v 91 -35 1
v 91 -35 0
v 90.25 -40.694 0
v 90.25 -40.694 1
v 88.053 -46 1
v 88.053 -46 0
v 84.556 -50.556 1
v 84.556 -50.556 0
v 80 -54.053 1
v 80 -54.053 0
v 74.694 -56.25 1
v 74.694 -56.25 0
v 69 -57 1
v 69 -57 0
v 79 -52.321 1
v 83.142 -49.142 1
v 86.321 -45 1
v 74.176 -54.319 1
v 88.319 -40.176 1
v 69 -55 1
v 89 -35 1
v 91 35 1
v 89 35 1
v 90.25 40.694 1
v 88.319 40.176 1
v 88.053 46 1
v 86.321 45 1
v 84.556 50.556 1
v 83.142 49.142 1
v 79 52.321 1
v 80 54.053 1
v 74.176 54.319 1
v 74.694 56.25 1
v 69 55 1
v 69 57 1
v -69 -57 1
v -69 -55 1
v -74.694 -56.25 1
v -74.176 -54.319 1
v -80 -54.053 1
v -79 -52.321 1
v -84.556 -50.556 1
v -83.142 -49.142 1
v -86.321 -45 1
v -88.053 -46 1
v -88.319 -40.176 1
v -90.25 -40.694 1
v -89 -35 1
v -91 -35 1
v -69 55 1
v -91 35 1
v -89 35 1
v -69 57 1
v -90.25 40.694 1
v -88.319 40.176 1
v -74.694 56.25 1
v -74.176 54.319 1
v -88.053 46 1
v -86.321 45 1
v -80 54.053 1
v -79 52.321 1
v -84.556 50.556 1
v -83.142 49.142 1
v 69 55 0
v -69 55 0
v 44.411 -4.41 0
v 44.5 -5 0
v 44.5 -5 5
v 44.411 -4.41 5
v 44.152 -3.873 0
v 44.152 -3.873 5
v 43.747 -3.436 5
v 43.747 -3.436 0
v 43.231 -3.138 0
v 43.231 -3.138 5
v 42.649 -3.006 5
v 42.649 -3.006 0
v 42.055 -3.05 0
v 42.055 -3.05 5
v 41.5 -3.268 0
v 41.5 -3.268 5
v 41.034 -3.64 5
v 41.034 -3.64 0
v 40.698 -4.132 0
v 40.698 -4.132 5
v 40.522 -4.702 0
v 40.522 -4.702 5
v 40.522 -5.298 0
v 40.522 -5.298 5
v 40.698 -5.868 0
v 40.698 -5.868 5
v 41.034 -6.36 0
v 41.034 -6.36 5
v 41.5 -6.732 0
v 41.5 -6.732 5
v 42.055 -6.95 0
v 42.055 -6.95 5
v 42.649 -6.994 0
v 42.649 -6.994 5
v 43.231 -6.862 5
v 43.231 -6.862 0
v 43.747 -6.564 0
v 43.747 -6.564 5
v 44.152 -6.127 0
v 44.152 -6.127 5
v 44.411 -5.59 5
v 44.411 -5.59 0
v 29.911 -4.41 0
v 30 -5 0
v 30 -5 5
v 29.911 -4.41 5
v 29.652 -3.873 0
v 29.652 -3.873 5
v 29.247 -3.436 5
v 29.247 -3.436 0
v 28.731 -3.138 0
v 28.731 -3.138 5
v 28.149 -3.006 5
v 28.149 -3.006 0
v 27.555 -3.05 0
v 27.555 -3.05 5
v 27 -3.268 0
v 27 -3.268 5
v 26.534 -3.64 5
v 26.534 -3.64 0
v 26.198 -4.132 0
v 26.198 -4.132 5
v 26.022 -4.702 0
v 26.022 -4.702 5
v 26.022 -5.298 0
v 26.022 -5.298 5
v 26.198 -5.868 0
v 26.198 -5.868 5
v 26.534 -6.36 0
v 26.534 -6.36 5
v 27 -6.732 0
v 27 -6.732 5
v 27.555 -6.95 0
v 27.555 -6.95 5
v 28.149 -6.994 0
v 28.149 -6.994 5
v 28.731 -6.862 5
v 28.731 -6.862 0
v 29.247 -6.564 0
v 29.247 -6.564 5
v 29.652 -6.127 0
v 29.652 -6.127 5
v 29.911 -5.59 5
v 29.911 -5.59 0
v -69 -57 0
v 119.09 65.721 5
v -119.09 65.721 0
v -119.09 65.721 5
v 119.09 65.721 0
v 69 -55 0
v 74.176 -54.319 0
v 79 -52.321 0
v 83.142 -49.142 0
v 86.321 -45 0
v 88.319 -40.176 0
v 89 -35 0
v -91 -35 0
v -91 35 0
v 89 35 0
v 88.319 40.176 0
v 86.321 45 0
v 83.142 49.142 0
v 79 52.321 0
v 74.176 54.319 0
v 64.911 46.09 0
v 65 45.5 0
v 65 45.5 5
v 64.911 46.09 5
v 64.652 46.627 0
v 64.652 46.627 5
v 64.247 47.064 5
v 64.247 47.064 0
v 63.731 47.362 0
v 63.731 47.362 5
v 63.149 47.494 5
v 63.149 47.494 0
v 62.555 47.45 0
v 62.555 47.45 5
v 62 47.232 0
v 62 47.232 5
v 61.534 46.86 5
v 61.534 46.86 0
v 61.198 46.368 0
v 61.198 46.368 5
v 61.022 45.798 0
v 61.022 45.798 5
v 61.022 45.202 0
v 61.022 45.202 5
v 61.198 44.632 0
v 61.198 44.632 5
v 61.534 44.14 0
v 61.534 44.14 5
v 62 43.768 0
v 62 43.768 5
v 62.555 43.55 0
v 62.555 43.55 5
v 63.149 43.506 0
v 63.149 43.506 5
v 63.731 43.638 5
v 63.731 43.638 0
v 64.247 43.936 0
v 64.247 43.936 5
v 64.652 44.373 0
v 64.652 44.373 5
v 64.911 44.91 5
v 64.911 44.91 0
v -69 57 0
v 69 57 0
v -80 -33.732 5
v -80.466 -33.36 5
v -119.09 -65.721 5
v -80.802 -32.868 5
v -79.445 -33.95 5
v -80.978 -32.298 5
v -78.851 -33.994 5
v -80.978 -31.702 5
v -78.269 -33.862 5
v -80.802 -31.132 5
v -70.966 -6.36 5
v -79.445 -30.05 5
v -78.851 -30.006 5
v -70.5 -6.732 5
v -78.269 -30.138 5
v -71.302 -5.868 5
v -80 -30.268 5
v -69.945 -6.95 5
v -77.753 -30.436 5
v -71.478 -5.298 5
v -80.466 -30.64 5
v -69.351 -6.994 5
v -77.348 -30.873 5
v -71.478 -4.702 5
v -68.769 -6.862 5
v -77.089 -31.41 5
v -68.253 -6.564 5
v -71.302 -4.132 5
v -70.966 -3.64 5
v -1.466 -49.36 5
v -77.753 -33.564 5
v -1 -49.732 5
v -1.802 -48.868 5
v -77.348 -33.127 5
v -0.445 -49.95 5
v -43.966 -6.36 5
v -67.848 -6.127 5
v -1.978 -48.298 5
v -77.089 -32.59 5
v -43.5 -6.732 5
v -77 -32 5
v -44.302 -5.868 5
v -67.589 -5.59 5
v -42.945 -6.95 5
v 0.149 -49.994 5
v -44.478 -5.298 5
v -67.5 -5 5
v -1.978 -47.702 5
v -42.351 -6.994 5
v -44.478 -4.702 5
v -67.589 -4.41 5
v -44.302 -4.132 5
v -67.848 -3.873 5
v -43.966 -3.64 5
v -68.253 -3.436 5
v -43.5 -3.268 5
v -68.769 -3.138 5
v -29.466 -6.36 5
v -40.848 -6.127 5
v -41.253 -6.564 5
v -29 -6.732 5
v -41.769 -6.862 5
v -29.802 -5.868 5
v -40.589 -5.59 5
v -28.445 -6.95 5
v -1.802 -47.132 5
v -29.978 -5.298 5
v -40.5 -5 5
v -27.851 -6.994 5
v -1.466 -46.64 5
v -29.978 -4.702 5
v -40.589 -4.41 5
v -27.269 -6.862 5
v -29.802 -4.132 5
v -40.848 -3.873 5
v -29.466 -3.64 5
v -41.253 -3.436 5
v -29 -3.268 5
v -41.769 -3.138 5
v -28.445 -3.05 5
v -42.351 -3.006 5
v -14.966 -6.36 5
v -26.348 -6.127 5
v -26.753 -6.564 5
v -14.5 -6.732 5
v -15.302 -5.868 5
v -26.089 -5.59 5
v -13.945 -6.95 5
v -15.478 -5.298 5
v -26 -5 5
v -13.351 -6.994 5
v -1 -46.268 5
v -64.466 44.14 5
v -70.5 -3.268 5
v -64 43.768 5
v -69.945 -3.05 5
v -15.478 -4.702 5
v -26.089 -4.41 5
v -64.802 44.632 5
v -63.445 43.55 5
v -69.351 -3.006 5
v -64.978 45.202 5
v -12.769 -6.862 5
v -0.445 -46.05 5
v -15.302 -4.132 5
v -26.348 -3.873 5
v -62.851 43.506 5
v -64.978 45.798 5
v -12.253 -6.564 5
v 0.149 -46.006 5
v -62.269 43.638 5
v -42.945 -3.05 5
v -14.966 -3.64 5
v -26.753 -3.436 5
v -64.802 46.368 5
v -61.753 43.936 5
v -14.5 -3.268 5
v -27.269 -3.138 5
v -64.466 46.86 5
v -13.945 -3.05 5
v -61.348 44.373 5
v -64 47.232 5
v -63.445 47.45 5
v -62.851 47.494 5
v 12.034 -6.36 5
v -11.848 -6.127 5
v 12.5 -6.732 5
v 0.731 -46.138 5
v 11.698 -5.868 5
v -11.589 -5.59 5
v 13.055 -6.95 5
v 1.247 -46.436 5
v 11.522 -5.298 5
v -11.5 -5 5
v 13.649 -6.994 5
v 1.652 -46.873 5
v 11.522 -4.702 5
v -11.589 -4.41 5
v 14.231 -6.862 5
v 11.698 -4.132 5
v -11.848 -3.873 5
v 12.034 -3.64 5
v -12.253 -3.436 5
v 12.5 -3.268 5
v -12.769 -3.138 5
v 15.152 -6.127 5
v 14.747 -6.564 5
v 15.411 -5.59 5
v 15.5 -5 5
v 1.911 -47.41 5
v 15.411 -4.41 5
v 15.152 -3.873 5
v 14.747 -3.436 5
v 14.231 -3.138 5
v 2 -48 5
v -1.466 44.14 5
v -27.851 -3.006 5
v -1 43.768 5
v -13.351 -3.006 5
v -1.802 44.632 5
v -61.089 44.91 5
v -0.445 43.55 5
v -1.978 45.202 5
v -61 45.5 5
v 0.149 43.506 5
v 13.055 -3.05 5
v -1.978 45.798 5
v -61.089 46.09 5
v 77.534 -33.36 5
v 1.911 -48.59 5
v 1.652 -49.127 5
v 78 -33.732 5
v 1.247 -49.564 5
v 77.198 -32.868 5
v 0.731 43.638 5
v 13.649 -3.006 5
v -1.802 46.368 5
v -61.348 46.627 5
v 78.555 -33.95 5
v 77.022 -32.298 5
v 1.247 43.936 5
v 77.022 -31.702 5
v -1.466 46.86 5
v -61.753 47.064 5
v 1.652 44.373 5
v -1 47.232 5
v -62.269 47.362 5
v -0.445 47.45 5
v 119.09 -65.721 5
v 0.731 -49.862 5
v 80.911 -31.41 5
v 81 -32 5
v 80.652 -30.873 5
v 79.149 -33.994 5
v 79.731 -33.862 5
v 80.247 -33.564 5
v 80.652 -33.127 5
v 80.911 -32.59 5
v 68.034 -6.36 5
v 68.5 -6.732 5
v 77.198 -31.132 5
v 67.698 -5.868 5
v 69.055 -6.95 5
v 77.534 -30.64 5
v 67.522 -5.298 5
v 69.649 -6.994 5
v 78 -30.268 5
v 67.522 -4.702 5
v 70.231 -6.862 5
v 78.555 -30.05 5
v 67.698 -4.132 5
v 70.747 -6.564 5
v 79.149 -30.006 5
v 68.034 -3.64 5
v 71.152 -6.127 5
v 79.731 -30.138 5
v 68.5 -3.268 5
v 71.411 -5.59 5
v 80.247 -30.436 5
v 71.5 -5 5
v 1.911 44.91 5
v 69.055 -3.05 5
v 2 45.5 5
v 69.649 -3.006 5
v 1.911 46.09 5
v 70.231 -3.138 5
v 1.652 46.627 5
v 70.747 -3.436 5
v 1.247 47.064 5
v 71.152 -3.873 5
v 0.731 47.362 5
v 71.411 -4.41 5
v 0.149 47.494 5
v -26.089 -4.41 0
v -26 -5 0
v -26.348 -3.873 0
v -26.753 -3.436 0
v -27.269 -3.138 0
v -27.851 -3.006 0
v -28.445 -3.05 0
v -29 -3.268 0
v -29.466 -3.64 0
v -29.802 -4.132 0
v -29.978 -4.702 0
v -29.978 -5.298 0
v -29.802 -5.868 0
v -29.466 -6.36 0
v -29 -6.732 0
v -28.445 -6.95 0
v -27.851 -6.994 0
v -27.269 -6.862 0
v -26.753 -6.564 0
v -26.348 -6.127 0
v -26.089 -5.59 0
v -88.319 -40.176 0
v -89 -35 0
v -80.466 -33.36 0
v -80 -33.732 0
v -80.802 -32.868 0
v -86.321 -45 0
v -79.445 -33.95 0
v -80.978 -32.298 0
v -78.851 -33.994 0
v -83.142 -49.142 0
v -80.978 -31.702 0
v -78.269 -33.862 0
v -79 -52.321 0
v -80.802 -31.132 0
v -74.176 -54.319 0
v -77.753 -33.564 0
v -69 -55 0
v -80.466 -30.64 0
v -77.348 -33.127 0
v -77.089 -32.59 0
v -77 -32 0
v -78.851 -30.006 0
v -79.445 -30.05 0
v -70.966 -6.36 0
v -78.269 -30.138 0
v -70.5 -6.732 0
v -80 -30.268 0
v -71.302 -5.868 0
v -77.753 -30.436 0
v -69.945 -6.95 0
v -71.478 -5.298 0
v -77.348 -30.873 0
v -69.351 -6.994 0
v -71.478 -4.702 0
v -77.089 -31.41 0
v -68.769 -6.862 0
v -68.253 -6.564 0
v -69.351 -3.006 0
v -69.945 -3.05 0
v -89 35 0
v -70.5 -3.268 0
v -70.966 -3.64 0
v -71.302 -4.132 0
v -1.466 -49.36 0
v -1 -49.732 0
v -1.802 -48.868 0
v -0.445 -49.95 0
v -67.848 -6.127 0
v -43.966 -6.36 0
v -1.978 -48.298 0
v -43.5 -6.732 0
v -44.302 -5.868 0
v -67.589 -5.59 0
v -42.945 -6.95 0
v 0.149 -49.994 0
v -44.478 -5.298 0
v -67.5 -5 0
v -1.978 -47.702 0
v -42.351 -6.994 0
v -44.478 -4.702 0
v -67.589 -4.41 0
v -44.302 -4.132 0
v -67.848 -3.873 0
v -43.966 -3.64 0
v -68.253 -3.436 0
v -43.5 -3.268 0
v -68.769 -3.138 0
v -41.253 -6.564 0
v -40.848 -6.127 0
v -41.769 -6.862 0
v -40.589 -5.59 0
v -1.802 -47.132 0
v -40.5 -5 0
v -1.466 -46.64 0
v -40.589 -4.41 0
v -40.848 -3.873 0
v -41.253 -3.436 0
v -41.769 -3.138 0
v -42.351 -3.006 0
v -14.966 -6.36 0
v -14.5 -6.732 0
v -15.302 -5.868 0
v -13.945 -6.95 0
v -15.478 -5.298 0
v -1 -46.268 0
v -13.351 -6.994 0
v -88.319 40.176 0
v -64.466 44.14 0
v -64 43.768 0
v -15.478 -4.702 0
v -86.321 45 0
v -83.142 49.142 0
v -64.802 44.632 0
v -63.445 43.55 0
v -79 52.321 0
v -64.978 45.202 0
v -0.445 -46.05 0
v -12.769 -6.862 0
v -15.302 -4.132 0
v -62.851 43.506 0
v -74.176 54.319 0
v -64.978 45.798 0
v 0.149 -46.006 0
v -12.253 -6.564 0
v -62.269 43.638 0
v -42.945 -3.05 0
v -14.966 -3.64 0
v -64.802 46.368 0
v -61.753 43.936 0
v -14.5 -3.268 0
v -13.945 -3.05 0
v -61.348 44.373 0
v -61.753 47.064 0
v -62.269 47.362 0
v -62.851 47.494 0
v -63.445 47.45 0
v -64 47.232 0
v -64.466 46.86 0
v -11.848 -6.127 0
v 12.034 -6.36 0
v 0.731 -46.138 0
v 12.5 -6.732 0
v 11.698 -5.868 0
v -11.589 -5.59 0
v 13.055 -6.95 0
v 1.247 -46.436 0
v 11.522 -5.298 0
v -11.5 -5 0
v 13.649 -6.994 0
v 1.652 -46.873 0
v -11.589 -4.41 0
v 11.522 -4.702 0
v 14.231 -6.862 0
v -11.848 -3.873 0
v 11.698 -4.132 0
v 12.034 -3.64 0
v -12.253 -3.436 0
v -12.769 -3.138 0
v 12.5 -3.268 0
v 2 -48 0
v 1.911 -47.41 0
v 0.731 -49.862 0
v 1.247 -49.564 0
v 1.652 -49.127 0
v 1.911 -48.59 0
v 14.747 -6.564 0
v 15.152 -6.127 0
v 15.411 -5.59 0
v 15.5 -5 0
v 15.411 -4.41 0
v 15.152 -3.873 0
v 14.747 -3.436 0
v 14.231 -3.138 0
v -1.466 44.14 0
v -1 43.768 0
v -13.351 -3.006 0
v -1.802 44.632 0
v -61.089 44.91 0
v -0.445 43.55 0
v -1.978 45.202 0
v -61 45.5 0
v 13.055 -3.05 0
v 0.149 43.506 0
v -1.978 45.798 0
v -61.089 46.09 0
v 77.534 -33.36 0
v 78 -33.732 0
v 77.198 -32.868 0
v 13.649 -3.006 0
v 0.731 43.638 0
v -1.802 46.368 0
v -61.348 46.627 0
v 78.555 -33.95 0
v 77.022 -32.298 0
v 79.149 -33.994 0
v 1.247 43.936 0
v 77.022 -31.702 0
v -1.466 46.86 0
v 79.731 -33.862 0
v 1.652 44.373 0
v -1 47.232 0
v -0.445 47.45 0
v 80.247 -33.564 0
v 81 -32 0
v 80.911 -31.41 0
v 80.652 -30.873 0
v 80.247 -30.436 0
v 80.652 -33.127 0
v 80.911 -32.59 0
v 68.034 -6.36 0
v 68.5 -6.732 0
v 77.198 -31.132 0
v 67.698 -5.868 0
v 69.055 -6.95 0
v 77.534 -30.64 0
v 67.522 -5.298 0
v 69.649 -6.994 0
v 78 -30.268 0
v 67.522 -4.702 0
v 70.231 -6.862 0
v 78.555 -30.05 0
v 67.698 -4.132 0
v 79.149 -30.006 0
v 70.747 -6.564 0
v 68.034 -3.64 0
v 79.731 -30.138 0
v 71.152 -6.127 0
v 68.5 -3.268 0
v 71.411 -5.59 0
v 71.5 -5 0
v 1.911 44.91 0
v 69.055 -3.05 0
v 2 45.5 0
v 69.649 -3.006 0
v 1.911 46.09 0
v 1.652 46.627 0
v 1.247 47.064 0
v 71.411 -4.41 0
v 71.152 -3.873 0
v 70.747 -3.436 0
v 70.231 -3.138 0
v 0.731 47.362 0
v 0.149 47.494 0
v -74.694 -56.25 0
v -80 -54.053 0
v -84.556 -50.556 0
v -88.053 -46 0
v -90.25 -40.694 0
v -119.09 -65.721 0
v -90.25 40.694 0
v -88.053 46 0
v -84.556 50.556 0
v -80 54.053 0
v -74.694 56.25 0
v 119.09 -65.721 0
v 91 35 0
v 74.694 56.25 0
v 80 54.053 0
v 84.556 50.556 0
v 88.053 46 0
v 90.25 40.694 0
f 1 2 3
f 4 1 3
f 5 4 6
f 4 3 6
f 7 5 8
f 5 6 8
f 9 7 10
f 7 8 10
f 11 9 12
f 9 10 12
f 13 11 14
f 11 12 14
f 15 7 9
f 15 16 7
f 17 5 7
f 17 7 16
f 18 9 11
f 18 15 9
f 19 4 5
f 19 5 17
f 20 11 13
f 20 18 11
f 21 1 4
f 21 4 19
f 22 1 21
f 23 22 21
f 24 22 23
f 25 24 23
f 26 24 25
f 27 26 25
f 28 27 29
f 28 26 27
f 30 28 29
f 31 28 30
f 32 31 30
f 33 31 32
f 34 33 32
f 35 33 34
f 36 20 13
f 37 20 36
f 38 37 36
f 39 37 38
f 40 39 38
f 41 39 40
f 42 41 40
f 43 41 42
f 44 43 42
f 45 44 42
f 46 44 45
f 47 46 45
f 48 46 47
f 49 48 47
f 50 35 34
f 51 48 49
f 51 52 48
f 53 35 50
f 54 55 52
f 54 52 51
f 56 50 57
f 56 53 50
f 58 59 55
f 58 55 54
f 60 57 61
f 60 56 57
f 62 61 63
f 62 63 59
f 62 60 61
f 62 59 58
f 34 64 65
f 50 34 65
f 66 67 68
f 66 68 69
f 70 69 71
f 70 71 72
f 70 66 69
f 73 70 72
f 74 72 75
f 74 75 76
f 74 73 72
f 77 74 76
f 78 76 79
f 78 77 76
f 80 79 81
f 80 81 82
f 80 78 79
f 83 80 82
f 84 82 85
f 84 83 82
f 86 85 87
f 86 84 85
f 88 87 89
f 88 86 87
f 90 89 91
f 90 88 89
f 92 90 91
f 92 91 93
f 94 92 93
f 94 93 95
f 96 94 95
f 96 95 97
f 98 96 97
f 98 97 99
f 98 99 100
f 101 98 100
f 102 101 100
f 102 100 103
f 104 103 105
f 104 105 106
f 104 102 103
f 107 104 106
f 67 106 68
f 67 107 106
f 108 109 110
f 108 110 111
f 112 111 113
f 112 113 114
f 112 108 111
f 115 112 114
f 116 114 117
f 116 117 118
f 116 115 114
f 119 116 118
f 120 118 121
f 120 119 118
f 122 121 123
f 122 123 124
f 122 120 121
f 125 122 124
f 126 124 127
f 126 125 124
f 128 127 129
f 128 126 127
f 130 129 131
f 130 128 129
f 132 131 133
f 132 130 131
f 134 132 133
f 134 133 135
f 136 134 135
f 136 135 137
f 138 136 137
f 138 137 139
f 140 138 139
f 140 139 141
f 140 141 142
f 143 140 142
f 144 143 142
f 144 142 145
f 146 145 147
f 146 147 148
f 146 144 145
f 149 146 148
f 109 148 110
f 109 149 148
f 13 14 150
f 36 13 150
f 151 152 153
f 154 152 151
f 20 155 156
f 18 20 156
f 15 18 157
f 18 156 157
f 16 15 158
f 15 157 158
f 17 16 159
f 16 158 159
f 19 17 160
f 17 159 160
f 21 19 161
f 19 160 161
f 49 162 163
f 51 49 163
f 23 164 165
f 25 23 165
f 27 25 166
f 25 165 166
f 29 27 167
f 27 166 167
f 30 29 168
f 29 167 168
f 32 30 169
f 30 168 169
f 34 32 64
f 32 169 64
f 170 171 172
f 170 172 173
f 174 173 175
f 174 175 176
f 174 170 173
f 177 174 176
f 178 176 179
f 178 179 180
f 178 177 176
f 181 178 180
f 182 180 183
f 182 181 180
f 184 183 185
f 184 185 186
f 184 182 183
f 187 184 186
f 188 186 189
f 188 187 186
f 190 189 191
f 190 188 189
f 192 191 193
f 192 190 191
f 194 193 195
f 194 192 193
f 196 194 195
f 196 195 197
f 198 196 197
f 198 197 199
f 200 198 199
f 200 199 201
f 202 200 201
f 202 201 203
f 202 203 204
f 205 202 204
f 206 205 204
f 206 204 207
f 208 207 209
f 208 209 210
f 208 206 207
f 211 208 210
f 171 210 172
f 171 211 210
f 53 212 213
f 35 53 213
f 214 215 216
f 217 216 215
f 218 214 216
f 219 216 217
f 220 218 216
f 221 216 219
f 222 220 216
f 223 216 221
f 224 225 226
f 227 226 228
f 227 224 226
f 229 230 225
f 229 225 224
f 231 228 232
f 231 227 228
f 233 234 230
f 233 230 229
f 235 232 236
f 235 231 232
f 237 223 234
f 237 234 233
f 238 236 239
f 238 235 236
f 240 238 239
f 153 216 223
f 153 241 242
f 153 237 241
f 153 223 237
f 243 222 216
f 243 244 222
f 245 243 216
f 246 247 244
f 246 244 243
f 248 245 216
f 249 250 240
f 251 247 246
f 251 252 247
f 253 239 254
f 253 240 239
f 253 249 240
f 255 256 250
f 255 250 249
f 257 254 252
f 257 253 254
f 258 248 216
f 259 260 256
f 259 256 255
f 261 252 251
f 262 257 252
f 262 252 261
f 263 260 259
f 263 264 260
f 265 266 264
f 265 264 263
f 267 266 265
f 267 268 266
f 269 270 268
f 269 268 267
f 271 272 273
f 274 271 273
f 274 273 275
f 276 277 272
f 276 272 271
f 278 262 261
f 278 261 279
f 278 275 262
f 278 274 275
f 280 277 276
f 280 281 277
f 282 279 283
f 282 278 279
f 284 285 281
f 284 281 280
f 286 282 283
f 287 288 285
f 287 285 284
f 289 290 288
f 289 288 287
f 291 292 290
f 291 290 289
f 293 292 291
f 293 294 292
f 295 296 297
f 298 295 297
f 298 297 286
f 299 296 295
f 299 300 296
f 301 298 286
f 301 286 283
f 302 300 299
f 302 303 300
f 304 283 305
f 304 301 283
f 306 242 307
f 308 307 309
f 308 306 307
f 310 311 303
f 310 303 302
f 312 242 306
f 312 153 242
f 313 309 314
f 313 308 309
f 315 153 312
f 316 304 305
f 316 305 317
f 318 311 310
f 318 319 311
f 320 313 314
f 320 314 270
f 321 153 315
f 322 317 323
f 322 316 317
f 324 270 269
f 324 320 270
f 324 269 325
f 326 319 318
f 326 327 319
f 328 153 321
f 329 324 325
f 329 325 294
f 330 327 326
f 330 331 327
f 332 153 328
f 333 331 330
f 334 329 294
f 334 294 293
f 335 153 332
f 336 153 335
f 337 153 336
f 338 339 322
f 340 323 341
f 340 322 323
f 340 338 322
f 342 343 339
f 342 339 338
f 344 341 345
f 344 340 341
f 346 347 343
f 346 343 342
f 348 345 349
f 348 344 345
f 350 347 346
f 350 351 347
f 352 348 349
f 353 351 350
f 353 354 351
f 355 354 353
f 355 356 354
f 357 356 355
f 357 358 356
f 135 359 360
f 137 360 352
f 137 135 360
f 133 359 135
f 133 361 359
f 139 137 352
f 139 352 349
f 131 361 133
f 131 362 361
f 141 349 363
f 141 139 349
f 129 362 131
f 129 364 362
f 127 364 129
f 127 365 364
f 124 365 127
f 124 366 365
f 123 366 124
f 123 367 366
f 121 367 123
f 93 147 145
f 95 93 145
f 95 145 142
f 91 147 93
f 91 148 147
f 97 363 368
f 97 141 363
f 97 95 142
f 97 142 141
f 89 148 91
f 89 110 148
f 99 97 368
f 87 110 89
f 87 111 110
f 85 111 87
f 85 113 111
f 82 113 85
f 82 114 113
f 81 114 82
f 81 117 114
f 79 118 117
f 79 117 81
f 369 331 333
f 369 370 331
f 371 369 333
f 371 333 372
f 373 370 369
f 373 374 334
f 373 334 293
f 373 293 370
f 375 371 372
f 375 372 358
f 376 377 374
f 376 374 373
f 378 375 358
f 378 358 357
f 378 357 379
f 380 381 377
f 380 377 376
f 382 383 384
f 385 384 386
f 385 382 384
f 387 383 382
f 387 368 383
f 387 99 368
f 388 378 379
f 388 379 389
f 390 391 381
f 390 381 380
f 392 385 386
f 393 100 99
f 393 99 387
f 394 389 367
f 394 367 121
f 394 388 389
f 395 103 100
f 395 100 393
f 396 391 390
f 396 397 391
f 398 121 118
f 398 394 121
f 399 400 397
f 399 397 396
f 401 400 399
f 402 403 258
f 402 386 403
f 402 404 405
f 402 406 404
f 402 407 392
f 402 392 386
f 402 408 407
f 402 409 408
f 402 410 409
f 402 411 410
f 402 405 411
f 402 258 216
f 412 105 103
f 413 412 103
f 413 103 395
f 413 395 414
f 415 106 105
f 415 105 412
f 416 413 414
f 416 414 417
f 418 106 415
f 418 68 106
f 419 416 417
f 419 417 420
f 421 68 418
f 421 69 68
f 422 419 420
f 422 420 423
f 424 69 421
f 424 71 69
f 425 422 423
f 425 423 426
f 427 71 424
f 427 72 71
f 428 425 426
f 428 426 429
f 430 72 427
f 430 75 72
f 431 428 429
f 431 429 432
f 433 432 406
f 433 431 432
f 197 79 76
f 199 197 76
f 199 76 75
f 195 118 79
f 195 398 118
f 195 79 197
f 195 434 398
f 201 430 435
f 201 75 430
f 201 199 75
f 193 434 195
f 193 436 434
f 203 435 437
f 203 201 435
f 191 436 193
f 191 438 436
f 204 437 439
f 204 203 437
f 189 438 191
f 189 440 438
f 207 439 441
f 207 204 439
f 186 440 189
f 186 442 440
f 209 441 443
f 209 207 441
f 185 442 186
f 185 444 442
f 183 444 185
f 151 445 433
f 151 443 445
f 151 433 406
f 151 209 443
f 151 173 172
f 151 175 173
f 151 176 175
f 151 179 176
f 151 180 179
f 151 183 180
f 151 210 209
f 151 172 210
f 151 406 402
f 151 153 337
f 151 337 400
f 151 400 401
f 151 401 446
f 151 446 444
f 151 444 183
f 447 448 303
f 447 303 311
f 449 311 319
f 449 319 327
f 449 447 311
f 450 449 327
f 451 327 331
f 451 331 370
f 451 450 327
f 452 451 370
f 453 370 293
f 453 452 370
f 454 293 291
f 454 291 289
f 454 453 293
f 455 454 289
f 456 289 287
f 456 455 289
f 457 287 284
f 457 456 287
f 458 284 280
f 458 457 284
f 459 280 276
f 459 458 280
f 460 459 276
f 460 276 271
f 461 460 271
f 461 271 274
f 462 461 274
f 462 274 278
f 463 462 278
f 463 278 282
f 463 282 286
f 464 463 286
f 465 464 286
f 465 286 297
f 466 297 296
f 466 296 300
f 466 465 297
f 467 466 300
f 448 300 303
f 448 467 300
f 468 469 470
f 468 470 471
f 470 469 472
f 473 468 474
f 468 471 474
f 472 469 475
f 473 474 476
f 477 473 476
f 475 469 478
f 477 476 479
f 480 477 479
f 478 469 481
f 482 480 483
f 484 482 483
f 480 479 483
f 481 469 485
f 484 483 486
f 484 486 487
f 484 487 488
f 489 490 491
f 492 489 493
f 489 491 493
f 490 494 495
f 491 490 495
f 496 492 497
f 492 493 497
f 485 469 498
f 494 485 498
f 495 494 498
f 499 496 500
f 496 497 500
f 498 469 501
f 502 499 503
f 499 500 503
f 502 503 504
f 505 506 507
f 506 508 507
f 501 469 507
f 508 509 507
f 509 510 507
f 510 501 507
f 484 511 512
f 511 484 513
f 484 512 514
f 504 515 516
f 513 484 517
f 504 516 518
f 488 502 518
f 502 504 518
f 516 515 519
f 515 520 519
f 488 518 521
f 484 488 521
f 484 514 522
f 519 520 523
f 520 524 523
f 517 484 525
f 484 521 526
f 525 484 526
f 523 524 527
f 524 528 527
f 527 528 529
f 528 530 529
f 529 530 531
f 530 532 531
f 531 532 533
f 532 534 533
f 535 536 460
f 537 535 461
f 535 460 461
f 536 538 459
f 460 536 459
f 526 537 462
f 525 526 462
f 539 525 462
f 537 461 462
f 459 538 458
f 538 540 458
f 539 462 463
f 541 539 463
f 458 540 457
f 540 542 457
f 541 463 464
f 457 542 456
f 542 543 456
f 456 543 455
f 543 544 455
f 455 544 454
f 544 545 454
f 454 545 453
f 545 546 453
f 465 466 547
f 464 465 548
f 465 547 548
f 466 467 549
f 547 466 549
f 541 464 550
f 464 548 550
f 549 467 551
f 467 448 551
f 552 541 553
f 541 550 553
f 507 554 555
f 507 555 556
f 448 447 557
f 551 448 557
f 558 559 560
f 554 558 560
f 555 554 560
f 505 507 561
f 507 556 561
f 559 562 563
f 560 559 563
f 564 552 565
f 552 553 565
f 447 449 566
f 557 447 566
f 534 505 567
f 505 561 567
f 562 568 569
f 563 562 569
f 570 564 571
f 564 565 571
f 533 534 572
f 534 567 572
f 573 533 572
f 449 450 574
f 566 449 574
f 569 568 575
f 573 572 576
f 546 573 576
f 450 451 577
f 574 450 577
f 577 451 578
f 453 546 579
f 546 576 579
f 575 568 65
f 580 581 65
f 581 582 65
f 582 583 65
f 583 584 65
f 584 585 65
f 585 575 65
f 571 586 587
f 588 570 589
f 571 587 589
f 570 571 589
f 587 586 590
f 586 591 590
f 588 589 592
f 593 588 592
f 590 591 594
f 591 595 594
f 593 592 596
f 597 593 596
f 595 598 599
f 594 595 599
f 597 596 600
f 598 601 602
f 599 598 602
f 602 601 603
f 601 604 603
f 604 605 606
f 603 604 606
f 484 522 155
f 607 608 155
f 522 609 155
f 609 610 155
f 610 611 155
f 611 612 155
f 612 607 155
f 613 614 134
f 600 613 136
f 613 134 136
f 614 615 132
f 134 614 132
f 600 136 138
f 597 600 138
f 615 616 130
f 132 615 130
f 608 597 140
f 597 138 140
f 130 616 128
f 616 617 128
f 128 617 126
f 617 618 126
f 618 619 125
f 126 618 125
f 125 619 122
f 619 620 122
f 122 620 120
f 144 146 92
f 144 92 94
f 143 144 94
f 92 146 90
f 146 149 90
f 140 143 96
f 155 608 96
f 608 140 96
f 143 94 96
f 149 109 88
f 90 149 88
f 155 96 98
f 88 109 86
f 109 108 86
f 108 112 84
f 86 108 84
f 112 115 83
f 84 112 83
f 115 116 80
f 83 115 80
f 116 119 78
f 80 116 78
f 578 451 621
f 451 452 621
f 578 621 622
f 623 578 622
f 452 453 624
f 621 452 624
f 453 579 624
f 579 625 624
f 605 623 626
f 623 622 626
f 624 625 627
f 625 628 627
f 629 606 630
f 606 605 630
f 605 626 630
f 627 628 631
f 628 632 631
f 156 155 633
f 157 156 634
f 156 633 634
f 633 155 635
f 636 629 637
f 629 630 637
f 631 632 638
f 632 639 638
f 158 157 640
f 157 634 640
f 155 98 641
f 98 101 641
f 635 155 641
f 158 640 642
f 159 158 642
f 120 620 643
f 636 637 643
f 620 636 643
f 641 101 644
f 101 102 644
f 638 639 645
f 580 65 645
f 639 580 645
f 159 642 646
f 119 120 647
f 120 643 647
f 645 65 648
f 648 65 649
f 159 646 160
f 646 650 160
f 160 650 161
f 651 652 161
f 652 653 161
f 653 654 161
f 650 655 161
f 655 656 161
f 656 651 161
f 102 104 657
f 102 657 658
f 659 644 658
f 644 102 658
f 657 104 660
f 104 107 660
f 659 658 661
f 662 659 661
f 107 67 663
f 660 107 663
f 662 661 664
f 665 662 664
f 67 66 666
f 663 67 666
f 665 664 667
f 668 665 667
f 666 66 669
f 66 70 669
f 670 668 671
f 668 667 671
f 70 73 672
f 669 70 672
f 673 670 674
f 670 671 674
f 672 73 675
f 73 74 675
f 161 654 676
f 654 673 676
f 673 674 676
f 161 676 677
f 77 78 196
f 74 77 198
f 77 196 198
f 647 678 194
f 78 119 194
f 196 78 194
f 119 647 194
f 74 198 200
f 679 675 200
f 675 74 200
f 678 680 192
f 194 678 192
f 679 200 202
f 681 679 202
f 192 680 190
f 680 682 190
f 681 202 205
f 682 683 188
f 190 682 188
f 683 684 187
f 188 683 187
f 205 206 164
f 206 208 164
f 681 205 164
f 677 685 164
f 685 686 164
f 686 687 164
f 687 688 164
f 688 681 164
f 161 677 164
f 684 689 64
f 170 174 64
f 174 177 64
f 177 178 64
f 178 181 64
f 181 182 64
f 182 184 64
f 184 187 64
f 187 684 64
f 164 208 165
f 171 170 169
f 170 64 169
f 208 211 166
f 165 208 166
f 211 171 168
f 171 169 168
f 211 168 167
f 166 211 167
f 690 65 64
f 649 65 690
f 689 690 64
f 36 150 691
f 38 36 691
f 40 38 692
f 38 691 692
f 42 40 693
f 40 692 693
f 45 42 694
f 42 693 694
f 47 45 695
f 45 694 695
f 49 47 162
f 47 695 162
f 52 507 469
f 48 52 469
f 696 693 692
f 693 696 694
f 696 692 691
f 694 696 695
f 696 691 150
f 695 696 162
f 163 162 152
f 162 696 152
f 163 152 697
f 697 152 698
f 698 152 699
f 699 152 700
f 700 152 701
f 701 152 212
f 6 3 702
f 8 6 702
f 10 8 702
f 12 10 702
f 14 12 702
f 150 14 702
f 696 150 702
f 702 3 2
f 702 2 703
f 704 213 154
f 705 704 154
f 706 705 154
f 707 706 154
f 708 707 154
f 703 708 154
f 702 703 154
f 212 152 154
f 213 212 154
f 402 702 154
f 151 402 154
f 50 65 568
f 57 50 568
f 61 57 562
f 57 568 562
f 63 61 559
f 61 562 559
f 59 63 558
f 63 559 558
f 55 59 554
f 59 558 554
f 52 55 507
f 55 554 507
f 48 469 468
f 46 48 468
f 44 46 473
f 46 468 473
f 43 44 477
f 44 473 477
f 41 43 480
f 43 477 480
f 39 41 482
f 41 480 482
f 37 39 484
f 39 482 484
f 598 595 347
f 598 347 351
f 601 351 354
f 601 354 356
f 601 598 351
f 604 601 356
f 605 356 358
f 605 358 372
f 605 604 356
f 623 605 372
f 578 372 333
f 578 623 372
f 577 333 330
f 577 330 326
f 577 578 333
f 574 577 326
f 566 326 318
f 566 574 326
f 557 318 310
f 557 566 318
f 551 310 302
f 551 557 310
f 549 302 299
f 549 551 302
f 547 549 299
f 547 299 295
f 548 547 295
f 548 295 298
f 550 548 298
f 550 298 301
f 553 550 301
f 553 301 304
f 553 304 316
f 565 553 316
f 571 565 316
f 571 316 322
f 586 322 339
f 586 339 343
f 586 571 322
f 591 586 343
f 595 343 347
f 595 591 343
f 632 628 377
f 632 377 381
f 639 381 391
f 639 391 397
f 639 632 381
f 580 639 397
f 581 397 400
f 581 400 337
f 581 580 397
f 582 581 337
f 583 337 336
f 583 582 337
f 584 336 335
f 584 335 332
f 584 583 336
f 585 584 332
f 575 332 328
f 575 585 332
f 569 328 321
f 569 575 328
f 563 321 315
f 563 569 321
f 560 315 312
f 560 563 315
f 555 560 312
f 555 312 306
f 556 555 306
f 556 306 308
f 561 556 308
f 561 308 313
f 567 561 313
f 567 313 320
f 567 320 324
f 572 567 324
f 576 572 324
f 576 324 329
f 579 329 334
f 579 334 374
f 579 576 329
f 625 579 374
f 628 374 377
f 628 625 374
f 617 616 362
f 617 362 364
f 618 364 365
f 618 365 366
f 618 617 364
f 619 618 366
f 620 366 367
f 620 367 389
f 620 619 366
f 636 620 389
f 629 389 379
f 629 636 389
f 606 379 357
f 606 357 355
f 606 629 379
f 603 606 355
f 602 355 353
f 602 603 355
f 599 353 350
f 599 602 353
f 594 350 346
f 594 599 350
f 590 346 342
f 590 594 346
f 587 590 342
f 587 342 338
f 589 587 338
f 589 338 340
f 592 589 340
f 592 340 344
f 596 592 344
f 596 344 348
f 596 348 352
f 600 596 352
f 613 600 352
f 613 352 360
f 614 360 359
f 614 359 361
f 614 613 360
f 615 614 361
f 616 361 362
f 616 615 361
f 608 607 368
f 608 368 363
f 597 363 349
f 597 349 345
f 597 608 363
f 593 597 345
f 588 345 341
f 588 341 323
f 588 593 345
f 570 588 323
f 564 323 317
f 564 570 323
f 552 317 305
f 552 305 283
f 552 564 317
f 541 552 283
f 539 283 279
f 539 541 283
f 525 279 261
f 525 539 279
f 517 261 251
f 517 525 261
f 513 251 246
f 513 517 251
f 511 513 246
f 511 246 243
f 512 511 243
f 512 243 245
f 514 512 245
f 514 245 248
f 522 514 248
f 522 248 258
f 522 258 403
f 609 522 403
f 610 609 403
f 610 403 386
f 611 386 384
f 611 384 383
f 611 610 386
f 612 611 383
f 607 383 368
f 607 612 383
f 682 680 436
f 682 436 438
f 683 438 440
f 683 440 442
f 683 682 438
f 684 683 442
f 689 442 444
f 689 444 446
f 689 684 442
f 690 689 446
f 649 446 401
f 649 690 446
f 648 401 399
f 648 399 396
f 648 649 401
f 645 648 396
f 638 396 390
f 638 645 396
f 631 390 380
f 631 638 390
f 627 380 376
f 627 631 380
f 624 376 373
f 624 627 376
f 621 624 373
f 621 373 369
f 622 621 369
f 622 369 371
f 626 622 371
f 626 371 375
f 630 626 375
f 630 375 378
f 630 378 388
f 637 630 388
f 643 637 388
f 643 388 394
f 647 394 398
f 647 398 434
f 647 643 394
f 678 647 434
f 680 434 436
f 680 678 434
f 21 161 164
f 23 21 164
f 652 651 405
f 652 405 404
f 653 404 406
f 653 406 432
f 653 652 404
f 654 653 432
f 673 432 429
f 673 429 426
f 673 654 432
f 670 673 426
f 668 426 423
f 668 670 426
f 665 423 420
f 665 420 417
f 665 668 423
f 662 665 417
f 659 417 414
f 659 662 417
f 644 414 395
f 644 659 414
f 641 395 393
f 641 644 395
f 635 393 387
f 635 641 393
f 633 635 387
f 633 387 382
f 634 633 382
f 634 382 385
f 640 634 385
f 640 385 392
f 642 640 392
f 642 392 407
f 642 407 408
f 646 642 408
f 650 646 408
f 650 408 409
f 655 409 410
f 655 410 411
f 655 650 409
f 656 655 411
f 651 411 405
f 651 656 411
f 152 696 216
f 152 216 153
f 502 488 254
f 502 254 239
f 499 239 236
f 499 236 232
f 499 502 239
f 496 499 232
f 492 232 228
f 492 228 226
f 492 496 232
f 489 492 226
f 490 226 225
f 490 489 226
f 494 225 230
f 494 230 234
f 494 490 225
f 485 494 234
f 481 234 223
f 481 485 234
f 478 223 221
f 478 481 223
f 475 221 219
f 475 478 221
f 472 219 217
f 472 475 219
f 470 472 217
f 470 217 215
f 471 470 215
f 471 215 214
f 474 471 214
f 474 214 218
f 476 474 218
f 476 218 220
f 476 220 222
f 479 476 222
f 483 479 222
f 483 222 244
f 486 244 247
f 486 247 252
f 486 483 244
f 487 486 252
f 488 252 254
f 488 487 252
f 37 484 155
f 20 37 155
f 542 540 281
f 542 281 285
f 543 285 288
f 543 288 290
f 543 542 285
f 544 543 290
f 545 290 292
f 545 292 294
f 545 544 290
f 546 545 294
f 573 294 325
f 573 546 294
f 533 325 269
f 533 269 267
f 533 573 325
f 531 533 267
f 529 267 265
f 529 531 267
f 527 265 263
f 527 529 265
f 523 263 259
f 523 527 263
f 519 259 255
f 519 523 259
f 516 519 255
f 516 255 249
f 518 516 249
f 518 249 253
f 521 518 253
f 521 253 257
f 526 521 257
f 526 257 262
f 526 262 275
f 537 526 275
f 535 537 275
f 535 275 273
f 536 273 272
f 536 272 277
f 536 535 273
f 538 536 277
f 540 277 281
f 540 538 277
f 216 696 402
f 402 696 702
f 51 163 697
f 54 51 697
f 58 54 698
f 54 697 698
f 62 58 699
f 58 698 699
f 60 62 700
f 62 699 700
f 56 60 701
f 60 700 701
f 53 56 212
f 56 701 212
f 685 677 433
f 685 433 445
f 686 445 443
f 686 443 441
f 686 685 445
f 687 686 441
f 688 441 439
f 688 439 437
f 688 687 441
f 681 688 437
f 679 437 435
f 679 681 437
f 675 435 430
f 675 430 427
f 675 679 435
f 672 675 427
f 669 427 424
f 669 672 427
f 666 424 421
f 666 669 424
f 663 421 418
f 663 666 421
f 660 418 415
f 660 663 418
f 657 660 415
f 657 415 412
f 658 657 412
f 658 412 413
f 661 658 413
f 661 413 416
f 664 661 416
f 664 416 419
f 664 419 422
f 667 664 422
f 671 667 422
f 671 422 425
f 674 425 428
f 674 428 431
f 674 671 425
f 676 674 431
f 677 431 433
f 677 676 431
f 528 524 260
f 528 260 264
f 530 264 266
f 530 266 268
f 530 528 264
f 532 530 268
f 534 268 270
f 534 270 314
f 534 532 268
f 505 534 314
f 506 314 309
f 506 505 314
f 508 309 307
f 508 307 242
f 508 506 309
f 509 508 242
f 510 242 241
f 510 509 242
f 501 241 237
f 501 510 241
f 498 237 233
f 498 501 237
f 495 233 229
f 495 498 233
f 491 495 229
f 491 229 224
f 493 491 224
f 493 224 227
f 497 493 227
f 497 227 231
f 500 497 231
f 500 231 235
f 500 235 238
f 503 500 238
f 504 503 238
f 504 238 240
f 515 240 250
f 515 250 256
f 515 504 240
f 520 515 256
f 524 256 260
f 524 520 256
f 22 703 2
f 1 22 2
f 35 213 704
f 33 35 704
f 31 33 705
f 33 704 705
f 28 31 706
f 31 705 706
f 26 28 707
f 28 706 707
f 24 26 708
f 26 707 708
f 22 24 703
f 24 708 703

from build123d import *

# Parameters (mm, degrees)
SKETCH_2_W          = 238.179152398
SKETCH_2_H          = 131.442897672
SKETCH_2_R          = 2
EXTRUDE_1_DEPTH     = 5
CUT_EXTRUDE_1_DEPTH = 1


with BuildPart() as part:
    # 草图2 → 凸台-拉伸1 (new body)
    with BuildSketch(Plane.XY):
        Rectangle(SKETCH_2_W, SKETCH_2_H)
        with Locations((13.5, -5)):
            Circle(SKETCH_2_R, mode=Mode.SUBTRACT)
        with Locations((28, -5)):
            Circle(SKETCH_2_R, mode=Mode.SUBTRACT)
        with Locations((42.5, -5)):
            Circle(SKETCH_2_R, mode=Mode.SUBTRACT)
        with Locations((79, -32)):
            Circle(SKETCH_2_R, mode=Mode.SUBTRACT)
        with Locations((69.5, -5)):
            Circle(SKETCH_2_R, mode=Mode.SUBTRACT)
        with Locations((-63, 45.5)):
            Circle(SKETCH_2_R, mode=Mode.SUBTRACT)
        with Locations((0, 45.5)):
            Circle(SKETCH_2_R, mode=Mode.SUBTRACT)
        with Locations((63, 45.5)):
            Circle(SKETCH_2_R, mode=Mode.SUBTRACT)
        with Locations((-79, -32)):
            Circle(SKETCH_2_R, mode=Mode.SUBTRACT)
        with Locations((-69.5, -5)):
            Circle(SKETCH_2_R, mode=Mode.SUBTRACT)
        with Locations((-42.5, -5)):
            Circle(SKETCH_2_R, mode=Mode.SUBTRACT)
        with Locations((-28, -5)):
            Circle(SKETCH_2_R, mode=Mode.SUBTRACT)
        with Locations((-13.5, -5)):
            Circle(SKETCH_2_R, mode=Mode.SUBTRACT)
        with Locations((0, -48)):
            Circle(SKETCH_2_R, mode=Mode.SUBTRACT)
    extrude(amount=EXTRUDE_1_DEPTH)

    # 草图2<3> → 切除-拉伸1 (cut)
    with BuildSketch(Plane.XY):
        with BuildLine():
            Line((-69, -57), (69, -57))
            ThreePointArc((69, -57), (84.556349186, -50.556349186), (91, -35))
            Line((91, -35), (91, 35))
            ThreePointArc((91, 35), (84.556349186, 50.556349186), (69, 57))
            Line((69, 57), (-69, 57))
            ThreePointArc((-69, 57), (-84.556349186, 50.556349186), (-91, 35))
            Line((-91, 35), (-91, -35))
            ThreePointArc((-91, -35), (-84.556349186, -50.556349186), (-69, -57))
        make_face()
        with BuildLine():
            Line((-69, 55), (69, 55))
            ThreePointArc((69, 55), (83.142135624, 49.142135624), (89, 35))
            Line((89, 35), (89, -35))
            ThreePointArc((89, -35), (83.142135624, -49.142135624), (69, -55))
            Line((69, -55), (-69, -55))
            ThreePointArc((-69, -55), (-83.142135624, -49.142135624), (-89, -35))
            Line((-89, -35), (-89, 35))
            ThreePointArc((-89, 35), (-83.142135624, 49.142135624), (-69, 55))
        make_face(mode=Mode.SUBTRACT)
    extrude(amount=CUT_EXTRUDE_1_DEPTH, mode=Mode.SUBTRACT)


solid = part.part
